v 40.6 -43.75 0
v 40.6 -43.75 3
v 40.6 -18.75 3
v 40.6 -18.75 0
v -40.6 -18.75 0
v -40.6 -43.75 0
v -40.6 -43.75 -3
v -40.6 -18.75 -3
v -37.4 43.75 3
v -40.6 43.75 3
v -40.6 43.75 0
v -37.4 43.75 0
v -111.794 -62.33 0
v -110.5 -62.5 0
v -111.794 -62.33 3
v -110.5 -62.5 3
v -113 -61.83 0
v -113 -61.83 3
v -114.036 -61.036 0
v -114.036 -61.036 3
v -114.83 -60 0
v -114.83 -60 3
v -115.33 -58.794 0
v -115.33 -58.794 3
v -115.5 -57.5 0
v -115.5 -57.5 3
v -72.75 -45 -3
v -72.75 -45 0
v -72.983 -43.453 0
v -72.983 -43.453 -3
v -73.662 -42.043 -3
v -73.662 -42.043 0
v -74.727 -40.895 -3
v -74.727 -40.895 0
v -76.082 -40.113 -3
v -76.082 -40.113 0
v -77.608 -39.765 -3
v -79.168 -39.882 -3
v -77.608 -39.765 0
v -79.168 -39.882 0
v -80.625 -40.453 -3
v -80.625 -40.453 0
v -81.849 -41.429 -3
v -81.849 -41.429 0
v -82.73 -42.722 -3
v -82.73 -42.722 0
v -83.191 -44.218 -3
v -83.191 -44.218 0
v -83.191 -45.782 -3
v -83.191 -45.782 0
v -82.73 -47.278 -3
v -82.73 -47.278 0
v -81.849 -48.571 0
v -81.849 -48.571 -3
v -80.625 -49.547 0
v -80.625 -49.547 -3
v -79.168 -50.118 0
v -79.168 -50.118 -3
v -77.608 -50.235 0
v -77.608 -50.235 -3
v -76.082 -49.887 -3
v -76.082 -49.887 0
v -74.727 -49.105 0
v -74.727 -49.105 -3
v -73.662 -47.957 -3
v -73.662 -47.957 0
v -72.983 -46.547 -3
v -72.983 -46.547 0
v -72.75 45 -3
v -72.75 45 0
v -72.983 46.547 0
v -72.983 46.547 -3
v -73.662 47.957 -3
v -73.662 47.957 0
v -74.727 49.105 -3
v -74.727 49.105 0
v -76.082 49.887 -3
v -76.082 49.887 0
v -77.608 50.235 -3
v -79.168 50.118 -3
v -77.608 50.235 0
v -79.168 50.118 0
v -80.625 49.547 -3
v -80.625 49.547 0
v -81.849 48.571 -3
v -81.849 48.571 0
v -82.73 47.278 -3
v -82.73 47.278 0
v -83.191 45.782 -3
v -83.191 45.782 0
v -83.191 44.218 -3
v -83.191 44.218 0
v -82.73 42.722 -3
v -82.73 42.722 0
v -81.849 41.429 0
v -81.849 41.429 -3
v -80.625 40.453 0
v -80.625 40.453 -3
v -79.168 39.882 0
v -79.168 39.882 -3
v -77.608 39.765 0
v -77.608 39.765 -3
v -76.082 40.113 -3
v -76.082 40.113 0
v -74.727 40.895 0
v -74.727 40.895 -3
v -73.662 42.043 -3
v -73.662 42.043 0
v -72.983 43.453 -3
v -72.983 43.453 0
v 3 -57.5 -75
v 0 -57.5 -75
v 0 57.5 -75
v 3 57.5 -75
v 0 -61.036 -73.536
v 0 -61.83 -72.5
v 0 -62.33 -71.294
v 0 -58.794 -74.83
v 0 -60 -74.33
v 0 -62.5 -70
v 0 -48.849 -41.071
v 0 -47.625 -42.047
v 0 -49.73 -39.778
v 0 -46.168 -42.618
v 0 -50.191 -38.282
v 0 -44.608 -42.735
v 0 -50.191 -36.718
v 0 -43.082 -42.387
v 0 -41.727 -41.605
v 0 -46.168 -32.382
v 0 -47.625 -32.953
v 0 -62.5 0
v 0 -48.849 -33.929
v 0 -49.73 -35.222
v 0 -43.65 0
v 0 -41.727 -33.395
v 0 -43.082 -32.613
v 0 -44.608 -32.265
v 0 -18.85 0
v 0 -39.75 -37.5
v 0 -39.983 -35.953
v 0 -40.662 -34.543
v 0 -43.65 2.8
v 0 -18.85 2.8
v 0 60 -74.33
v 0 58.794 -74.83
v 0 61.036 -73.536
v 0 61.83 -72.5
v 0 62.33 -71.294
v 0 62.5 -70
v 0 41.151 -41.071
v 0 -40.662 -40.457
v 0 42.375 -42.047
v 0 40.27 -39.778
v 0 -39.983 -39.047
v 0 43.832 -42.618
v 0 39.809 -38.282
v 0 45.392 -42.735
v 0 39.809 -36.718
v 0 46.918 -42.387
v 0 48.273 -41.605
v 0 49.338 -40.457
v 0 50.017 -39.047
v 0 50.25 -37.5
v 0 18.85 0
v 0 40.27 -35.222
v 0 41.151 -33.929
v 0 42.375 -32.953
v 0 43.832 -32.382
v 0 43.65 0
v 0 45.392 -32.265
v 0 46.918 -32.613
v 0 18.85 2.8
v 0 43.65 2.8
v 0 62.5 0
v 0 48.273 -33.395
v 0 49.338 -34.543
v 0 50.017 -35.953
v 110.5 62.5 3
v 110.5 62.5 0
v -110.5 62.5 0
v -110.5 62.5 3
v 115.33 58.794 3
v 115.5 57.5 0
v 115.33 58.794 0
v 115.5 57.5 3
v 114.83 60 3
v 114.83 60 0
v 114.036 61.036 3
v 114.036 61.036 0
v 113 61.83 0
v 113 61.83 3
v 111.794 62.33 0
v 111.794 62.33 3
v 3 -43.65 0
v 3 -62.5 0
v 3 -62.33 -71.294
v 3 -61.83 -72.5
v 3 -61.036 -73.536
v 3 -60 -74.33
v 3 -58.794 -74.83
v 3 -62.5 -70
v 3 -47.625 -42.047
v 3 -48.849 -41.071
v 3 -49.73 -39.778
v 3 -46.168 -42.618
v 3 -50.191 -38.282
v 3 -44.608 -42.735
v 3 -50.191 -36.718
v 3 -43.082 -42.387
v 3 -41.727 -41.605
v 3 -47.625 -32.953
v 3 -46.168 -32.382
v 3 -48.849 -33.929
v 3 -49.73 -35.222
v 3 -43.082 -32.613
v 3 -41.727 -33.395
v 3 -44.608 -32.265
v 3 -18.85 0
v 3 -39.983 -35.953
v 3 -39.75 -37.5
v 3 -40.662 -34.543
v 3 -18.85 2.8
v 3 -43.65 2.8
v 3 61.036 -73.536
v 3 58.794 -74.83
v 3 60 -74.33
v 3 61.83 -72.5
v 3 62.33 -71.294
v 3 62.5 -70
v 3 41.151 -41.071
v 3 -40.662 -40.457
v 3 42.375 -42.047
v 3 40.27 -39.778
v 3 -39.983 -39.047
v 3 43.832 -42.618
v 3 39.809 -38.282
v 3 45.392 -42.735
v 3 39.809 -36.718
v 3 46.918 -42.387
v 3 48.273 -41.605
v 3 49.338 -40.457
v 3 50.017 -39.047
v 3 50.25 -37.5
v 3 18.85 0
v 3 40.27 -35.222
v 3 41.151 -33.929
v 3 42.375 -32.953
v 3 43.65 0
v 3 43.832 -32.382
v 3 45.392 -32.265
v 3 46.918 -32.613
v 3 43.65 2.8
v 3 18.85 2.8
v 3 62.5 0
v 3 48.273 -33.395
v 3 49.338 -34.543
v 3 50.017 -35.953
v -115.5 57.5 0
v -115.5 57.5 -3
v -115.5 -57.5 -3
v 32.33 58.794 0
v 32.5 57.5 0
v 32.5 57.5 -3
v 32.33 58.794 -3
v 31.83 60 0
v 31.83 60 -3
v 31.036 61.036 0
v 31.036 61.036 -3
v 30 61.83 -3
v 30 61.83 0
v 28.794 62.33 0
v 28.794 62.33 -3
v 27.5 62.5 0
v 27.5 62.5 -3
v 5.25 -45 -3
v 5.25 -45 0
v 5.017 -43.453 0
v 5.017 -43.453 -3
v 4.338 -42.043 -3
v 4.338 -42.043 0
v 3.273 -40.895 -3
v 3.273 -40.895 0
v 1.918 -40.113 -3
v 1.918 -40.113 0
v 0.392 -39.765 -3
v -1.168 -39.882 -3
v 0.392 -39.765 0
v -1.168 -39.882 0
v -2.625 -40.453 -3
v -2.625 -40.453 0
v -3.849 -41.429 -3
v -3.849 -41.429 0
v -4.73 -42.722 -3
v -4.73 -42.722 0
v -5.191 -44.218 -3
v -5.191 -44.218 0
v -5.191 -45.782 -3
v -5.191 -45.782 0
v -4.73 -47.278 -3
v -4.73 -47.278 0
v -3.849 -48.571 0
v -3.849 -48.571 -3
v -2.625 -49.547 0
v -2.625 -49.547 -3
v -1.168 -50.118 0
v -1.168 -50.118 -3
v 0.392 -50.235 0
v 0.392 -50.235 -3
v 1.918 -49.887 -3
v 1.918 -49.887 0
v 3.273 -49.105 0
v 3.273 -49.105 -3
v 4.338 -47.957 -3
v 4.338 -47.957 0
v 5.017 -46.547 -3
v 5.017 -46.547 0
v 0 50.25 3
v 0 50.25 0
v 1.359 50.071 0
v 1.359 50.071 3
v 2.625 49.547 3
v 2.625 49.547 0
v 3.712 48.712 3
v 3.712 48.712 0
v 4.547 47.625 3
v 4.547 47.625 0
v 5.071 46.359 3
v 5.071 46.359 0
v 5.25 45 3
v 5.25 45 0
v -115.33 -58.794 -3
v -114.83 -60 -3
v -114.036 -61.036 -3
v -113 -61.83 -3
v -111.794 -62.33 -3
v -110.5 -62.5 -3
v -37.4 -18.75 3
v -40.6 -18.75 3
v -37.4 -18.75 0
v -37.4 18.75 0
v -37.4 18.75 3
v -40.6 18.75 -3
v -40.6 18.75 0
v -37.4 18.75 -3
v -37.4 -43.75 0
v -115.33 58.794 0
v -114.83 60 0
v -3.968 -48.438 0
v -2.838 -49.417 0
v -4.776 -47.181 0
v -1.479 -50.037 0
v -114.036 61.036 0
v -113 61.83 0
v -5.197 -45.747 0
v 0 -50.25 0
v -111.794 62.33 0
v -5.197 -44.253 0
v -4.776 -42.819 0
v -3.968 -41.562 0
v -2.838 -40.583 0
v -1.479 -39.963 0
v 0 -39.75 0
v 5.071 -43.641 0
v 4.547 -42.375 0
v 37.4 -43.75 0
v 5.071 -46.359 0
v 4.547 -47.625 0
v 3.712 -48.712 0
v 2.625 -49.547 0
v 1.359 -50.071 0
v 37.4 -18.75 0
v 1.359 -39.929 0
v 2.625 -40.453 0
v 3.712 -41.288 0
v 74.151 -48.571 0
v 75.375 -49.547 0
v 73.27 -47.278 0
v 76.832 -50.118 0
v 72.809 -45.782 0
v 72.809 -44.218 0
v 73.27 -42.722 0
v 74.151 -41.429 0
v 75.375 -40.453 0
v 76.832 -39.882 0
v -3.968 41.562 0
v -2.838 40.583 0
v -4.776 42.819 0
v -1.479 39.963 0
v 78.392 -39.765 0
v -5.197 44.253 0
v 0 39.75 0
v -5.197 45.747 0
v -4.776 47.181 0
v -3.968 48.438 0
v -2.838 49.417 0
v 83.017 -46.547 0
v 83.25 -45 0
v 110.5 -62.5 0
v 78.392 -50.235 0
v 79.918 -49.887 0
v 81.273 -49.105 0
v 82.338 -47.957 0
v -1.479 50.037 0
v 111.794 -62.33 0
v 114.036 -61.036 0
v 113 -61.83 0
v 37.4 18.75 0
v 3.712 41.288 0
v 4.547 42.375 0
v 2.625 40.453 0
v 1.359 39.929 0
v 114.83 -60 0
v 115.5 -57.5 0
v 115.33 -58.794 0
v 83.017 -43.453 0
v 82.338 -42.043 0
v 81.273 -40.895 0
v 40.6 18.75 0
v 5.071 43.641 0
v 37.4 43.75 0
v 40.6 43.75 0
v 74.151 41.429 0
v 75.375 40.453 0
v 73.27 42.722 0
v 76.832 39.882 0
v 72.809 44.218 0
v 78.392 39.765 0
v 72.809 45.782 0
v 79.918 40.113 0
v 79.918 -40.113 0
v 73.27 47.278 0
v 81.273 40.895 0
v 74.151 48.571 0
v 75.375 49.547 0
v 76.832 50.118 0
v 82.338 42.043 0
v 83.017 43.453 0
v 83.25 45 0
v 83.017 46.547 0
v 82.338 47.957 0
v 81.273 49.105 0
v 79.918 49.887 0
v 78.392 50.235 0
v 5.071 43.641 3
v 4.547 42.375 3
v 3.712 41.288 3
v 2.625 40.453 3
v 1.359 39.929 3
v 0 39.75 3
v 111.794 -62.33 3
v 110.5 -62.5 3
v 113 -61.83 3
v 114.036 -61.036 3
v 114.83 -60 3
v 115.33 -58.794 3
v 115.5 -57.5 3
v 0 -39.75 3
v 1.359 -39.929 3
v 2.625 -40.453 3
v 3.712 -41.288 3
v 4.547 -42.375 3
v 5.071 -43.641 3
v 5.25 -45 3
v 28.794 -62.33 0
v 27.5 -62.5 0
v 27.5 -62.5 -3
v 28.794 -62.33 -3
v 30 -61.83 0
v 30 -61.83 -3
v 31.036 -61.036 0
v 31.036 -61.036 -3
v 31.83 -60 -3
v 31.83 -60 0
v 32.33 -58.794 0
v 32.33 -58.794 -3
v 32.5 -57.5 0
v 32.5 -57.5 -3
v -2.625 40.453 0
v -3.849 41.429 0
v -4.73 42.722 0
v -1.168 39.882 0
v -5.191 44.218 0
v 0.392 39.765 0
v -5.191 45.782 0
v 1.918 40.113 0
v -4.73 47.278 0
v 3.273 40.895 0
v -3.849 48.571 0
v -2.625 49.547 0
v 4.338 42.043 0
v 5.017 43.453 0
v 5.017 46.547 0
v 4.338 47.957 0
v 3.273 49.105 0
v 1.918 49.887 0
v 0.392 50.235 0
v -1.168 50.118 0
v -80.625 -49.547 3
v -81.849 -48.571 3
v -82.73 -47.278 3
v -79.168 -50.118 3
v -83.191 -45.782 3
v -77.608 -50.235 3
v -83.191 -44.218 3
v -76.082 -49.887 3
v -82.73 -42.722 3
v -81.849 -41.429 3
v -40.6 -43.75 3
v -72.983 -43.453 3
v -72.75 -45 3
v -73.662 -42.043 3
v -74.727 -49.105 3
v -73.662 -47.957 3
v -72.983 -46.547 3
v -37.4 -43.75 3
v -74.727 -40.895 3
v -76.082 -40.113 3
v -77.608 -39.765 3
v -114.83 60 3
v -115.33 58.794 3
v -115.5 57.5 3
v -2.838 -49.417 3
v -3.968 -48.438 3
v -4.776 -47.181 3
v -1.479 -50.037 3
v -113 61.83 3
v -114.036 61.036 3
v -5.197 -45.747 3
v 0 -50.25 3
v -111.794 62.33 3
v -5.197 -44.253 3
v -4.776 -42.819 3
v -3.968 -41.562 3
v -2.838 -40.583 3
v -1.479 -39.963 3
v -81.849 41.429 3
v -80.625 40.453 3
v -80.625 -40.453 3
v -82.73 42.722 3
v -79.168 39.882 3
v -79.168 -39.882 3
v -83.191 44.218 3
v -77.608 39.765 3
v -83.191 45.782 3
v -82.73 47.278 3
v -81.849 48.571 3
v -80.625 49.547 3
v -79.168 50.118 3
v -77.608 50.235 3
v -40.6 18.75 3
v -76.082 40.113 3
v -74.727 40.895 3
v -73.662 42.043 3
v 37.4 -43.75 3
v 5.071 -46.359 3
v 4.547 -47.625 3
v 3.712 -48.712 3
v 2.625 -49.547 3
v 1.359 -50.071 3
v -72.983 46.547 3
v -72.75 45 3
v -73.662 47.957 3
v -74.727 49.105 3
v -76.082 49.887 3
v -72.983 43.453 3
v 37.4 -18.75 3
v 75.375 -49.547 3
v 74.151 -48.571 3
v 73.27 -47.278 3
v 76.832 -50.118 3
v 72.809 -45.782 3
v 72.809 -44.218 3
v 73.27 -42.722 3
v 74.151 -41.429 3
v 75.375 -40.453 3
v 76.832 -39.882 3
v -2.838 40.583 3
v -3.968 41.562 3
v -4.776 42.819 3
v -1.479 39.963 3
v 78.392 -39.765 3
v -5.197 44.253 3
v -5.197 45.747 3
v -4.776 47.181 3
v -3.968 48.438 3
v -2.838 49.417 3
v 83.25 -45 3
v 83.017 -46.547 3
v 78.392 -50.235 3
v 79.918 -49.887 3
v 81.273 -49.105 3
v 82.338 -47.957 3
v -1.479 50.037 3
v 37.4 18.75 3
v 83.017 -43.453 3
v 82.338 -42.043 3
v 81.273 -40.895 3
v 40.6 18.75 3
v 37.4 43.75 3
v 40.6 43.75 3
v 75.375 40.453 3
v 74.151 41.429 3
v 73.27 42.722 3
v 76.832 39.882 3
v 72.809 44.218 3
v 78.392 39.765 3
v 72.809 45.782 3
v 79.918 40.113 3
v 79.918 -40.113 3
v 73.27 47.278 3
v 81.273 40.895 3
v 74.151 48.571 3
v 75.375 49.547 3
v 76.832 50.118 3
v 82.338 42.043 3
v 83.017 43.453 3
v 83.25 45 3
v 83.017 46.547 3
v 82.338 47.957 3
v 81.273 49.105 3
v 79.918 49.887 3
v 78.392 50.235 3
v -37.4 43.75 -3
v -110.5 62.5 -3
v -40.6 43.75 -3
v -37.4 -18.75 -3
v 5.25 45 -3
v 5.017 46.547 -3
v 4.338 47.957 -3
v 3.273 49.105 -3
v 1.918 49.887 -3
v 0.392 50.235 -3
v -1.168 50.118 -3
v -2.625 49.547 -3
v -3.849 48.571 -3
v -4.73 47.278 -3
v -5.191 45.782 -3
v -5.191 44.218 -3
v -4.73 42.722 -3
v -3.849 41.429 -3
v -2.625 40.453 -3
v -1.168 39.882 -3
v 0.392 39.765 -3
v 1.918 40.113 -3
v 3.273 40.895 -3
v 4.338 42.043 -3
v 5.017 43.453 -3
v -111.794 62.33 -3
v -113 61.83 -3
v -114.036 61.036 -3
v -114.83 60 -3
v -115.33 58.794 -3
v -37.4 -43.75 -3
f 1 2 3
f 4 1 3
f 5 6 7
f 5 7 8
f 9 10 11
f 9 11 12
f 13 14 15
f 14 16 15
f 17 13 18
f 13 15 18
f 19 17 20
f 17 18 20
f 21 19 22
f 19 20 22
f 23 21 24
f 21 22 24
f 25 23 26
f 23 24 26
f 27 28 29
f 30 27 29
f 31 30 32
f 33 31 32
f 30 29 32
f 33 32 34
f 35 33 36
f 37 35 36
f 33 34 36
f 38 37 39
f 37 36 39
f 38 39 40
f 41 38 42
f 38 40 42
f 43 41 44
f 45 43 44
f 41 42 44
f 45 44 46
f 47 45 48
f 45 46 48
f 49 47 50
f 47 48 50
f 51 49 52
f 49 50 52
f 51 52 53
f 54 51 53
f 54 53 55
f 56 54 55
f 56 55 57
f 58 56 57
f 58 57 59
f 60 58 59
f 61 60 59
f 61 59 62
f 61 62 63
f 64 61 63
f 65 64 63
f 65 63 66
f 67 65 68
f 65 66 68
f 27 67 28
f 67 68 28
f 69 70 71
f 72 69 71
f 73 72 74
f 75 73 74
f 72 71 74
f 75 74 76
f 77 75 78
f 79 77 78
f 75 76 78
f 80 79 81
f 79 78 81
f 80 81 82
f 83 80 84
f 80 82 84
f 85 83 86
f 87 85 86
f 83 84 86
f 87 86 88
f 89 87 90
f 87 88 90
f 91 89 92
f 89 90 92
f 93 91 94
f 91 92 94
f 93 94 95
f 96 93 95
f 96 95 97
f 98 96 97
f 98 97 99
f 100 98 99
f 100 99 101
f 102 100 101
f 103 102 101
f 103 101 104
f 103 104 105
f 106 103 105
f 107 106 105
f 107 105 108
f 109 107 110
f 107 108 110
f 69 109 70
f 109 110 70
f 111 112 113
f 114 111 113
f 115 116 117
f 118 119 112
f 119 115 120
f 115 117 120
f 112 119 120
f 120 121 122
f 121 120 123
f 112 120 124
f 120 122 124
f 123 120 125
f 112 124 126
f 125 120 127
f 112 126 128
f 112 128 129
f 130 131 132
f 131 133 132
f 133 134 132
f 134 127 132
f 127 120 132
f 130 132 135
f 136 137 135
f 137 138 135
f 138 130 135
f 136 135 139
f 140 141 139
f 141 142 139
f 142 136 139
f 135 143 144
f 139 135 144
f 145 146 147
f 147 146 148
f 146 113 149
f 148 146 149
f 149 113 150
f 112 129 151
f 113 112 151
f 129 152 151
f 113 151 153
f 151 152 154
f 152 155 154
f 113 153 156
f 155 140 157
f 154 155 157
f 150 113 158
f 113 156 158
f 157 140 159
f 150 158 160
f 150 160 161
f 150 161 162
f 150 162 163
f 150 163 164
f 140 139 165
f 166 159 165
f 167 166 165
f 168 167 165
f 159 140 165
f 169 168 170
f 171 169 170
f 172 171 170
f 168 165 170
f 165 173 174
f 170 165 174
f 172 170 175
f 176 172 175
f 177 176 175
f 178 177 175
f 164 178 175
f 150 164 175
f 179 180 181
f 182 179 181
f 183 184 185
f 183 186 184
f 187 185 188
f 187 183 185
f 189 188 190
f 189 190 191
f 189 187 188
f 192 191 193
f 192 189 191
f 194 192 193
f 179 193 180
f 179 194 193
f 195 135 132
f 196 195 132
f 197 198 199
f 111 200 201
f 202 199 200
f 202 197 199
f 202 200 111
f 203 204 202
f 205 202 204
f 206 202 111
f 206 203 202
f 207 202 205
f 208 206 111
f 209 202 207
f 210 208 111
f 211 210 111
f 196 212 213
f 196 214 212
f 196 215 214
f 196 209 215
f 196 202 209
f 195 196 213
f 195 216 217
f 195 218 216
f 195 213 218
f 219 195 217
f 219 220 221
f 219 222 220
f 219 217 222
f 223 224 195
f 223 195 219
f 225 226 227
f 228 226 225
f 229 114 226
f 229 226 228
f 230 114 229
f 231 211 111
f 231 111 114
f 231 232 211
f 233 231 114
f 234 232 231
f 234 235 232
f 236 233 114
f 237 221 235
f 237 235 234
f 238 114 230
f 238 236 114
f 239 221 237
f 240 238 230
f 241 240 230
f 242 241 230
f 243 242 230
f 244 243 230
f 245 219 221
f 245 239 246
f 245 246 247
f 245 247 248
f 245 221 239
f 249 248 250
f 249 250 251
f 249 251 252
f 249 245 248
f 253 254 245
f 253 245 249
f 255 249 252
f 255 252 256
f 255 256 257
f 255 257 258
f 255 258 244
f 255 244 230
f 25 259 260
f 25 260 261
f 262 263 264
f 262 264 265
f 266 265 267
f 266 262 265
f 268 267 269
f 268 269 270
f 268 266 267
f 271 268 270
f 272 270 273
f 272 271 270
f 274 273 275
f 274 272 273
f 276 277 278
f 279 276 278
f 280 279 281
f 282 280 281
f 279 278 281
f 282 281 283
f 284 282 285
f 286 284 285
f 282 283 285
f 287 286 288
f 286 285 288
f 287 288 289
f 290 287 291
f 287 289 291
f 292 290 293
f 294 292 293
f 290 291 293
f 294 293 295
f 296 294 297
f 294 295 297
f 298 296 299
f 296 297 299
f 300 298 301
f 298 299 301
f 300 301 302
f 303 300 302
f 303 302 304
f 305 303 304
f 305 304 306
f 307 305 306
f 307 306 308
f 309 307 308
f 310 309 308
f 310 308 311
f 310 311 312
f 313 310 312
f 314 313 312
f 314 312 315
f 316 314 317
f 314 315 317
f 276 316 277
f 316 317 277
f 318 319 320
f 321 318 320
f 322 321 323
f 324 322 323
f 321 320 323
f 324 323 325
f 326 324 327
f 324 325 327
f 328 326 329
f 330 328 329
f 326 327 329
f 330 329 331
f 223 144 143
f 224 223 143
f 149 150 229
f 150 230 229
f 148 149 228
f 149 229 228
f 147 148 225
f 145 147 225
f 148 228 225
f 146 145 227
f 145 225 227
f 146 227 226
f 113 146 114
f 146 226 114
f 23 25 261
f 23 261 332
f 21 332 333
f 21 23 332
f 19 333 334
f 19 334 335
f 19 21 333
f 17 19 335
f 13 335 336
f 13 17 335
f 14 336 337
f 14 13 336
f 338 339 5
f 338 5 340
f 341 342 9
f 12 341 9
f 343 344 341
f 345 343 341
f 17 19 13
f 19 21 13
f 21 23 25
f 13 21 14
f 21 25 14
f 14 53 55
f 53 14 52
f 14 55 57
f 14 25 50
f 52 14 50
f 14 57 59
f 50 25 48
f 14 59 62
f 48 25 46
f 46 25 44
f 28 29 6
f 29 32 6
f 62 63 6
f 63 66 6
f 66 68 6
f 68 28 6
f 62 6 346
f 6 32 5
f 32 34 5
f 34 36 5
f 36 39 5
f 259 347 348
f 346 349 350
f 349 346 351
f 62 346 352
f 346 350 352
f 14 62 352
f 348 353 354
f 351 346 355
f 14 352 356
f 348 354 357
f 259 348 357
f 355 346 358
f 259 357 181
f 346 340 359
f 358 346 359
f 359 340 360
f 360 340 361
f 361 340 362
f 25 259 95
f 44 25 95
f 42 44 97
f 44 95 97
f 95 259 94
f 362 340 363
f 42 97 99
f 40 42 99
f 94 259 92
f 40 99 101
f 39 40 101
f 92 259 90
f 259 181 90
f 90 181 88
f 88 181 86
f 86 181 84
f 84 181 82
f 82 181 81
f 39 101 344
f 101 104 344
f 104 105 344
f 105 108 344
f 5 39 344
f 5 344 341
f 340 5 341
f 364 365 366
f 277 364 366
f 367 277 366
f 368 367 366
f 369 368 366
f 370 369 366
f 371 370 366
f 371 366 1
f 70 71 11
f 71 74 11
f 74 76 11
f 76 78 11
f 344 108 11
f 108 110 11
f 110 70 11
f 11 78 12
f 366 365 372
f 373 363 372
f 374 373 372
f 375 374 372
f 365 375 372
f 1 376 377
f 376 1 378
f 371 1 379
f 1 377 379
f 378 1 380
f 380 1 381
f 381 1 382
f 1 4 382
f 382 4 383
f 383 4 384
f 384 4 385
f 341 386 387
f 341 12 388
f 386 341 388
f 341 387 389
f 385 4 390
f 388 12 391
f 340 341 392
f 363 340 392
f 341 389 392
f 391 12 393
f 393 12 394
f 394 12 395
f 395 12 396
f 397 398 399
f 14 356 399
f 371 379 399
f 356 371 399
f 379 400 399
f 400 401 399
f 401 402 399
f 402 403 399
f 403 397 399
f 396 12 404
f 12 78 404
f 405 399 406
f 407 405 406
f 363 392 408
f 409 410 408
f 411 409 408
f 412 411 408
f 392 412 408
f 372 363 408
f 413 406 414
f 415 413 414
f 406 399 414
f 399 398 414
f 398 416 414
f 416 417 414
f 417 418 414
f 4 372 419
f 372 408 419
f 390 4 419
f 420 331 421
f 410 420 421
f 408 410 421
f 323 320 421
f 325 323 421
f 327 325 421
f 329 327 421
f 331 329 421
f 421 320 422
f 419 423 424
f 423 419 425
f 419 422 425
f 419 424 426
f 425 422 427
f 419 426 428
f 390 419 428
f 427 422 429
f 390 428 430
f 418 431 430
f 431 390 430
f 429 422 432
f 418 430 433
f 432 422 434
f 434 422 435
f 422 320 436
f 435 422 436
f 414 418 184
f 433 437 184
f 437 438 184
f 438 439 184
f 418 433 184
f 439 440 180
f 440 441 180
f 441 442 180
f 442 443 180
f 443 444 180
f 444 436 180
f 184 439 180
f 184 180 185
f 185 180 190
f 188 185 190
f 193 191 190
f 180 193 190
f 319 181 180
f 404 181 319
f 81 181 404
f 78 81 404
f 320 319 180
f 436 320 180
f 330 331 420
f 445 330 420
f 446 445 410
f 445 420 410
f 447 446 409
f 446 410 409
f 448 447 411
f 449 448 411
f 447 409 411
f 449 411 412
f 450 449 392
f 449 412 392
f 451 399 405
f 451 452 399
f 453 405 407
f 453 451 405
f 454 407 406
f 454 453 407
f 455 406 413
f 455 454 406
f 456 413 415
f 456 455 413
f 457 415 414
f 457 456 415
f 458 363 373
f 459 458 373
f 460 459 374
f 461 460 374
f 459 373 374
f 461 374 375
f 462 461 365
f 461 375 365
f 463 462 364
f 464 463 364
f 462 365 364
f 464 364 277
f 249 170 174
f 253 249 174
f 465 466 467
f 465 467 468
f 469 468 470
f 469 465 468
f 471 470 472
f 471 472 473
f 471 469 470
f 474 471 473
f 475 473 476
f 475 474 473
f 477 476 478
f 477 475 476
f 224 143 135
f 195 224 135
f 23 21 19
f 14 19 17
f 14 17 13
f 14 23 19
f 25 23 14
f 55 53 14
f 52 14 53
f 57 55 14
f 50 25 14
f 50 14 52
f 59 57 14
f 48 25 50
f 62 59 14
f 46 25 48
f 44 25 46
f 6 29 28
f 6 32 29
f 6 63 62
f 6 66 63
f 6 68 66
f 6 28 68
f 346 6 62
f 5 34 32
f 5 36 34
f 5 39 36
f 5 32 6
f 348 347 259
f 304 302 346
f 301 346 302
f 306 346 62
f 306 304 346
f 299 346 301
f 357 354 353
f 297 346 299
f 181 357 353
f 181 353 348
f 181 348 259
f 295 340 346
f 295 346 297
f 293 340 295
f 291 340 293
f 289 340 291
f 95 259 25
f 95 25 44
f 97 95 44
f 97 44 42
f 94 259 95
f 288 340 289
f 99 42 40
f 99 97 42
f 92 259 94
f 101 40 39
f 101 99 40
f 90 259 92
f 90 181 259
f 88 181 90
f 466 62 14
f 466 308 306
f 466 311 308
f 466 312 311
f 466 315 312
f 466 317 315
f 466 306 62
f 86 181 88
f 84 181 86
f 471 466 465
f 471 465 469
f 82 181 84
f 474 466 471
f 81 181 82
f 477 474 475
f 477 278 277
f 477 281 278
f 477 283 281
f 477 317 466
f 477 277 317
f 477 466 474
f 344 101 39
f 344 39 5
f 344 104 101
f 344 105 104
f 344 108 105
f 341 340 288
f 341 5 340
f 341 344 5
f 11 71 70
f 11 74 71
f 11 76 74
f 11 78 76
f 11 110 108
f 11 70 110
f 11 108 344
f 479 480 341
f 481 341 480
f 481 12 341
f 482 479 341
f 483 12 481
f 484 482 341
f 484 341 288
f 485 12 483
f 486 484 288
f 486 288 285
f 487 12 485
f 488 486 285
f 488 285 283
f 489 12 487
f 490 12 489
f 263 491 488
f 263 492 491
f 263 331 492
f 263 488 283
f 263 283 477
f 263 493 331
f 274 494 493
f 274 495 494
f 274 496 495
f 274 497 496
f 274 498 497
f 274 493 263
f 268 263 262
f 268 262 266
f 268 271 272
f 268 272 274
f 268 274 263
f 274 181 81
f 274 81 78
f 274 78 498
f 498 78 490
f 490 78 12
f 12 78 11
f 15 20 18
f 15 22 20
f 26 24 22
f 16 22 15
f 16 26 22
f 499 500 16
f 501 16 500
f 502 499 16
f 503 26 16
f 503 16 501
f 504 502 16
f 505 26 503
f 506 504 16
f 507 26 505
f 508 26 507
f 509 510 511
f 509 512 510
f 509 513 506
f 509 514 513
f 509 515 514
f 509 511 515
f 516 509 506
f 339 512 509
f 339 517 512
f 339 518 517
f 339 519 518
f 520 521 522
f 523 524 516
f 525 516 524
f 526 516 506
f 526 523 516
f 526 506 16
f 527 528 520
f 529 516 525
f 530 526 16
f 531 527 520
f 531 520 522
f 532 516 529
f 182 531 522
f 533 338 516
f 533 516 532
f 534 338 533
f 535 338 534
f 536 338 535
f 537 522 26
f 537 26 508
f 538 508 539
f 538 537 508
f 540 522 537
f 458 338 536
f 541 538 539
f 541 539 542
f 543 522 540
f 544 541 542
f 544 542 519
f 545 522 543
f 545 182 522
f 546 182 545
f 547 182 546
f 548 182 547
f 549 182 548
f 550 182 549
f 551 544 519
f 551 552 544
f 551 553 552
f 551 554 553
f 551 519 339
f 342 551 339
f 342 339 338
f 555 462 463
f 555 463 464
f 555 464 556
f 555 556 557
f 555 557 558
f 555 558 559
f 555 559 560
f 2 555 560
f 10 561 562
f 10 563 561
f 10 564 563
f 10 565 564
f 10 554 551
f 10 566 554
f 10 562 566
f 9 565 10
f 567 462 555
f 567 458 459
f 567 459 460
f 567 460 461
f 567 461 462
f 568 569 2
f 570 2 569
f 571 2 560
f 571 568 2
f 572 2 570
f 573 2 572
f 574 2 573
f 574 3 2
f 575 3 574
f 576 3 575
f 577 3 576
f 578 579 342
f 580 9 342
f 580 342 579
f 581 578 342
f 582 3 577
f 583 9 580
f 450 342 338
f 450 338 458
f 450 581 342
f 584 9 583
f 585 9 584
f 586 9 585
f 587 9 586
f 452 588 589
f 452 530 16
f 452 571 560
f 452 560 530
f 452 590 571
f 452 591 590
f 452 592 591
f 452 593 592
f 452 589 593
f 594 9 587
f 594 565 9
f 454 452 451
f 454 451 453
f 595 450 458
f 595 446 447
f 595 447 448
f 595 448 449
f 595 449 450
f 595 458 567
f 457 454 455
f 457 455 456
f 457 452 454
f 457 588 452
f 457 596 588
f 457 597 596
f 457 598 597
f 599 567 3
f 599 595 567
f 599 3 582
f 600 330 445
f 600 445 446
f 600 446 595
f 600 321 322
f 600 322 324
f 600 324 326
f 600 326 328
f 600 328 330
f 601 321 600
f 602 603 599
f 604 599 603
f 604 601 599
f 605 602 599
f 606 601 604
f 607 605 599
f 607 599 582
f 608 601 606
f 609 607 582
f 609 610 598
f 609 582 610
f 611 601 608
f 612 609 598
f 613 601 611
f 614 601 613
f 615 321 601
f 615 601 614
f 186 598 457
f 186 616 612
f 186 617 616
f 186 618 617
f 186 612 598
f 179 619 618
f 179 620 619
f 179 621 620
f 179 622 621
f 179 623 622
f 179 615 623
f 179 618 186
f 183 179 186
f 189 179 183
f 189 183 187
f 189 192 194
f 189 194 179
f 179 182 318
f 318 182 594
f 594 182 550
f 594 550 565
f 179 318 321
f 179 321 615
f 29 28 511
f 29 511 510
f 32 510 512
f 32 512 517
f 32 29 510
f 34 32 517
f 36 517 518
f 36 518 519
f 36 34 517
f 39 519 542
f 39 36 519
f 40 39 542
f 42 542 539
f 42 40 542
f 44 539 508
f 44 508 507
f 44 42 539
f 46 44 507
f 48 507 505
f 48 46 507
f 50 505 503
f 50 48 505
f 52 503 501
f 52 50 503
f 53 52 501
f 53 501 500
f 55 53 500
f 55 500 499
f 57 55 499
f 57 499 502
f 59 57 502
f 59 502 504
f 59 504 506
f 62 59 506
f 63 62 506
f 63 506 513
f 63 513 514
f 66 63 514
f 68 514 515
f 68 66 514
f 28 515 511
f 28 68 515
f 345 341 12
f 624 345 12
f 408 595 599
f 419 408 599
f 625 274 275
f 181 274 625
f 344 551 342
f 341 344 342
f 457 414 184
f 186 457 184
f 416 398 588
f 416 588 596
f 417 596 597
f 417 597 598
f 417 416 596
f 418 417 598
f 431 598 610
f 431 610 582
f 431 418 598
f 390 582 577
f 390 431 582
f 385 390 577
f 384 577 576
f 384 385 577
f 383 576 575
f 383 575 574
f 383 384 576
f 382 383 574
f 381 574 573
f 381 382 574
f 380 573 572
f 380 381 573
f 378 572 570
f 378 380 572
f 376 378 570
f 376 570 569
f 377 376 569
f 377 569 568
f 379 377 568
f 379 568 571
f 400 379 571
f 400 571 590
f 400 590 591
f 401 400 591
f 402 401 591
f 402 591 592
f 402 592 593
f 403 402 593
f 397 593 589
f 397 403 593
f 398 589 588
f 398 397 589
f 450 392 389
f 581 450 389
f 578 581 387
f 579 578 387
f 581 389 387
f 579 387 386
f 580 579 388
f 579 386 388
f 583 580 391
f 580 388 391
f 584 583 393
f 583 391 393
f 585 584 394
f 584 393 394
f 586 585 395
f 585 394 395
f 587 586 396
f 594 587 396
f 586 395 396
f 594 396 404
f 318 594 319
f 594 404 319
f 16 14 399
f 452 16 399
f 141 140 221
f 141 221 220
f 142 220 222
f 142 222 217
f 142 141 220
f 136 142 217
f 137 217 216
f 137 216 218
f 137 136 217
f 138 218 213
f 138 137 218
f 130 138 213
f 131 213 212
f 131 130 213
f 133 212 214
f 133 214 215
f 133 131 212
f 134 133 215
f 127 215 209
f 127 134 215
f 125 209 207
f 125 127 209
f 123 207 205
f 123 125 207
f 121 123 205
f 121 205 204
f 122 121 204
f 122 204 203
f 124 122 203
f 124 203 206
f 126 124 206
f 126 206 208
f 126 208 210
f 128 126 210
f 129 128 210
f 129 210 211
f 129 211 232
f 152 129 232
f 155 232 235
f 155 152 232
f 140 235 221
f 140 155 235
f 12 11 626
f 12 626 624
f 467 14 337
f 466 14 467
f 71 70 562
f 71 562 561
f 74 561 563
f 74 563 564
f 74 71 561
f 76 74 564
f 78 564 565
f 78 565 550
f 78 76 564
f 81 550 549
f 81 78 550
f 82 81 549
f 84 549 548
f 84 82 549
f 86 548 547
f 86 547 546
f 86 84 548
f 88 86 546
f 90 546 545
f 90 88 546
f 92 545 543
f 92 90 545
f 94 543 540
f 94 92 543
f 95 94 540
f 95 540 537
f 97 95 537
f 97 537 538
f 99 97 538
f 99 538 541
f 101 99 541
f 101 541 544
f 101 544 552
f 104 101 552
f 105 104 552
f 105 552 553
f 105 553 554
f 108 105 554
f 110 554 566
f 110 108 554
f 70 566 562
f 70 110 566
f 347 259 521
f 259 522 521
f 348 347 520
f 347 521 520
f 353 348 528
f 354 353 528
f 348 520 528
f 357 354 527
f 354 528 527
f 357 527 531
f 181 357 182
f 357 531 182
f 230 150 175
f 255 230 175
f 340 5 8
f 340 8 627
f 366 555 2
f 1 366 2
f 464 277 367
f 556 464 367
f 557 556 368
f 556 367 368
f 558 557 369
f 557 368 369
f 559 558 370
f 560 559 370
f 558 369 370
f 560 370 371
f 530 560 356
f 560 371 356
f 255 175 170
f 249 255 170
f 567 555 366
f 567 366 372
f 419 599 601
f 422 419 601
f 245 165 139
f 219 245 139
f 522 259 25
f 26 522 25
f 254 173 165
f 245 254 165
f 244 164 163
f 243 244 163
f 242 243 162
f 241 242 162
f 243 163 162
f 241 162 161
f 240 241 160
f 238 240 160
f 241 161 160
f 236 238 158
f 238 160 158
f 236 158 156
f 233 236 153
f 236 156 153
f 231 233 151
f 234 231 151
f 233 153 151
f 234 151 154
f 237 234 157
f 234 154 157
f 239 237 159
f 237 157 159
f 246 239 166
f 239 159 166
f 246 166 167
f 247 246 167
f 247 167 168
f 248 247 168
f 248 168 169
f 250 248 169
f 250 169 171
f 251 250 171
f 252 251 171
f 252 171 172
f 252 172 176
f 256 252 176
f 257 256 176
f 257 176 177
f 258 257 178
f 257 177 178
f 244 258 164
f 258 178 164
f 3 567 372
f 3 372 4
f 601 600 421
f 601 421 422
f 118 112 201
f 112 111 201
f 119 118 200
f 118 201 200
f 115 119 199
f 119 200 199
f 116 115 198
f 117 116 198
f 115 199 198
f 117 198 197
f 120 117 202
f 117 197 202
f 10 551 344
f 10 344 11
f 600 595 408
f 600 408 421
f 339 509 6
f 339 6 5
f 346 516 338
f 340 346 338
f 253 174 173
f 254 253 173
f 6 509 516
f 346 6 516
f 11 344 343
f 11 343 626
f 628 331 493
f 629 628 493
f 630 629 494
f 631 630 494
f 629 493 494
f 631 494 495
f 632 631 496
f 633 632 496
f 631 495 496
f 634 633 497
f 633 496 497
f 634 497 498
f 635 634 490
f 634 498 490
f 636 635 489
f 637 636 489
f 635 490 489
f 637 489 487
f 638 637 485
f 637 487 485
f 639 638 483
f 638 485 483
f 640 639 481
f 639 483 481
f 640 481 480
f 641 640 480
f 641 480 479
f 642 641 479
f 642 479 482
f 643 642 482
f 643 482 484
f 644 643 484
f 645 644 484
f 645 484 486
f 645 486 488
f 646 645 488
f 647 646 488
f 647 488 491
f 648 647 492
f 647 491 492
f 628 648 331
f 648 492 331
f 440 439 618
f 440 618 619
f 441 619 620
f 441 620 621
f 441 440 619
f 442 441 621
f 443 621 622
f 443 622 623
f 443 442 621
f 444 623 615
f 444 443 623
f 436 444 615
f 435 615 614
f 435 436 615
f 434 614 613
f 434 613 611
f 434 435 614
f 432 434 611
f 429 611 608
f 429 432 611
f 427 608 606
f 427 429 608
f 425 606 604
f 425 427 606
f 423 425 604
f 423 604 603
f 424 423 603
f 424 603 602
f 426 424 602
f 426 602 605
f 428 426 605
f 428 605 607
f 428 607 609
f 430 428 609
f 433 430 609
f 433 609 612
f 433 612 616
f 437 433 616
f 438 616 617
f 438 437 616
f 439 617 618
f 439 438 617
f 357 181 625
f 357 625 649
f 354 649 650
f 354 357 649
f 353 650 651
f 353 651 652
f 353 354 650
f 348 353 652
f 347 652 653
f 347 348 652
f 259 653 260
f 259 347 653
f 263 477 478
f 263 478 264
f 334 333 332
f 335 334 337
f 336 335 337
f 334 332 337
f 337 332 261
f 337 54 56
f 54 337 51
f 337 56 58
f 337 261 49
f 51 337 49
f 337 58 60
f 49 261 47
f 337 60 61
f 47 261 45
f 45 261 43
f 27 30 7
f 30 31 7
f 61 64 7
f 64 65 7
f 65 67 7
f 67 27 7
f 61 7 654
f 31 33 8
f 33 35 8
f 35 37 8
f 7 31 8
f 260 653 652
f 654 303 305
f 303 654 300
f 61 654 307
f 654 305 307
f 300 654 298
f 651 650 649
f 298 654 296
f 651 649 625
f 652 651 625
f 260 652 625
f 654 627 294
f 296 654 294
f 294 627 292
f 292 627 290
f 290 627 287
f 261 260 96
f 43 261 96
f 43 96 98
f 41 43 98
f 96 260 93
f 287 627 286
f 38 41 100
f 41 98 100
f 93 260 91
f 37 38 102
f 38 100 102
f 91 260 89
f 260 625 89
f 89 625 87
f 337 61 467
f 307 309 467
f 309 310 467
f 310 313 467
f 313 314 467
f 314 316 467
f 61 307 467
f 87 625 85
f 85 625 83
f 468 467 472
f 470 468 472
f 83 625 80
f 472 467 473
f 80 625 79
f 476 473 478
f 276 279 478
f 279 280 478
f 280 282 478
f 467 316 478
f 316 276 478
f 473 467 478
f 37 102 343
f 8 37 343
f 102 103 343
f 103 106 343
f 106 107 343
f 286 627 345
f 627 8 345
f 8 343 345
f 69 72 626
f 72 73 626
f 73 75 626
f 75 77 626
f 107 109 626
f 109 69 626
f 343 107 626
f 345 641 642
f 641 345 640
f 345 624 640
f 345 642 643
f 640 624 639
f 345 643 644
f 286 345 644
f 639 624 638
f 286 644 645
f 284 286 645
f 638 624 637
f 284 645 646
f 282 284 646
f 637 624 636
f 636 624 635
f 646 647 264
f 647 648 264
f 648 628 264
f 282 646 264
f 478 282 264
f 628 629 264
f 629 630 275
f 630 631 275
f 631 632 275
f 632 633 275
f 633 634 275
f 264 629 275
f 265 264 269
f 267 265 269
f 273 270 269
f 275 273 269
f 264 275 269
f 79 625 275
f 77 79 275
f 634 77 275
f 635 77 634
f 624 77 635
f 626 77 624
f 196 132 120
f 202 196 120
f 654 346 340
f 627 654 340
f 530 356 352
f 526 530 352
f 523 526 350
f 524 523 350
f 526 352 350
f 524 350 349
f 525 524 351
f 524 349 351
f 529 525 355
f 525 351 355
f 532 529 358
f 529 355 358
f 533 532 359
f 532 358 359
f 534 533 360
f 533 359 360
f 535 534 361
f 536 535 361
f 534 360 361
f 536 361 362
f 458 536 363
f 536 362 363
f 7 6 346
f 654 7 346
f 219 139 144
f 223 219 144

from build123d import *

# Parameters (mm, degrees)
F0_R     = 5.25
F1_DEPTH = 3
F2_W     = 3.2
F2_H     = 25
F3_DEPTH = 25
F4_R     = 5
F5_R     = 5.25
F6_DEPTH = 3
F7_R     = 5
F8_R     = 5.25
F8_W     = 3.2
F8_H     = 25
F9_DEPTH = 3


with BuildPart() as f1:
    # F0 (on Top) → F1 (new body)
    with BuildSketch(Plane.XY):
        with BuildLine():
            Line((0, 0), (-115.5, 0))
            Line((-115.5, 0), (-115.5, -62.5))
            Line((-115.5, -62.5), (0, -62.5))
            Line((0, -62.5), (0, -50.25))
            ThreePointArc((0, -50.25), (-5.25, -45), (0, -39.75))
            Line((0, -39.75), (0, 0))
        make_face()
        with Locations((-78, -45)):
            Circle(F0_R, mode=Mode.SUBTRACT)
        with BuildLine():
            Line((115.5, 0), (0, 0))
            Line((0, 0), (0, -39.75))
            ThreePointArc((0, -39.75), (3.712311, -41.287689), (5.25, -45))
            ThreePointArc((5.25, -45), (3.712311, -48.712311), (0, -50.25))
            Line((0, -50.25), (0, -62.5))
            Line((0, -62.5), (115.5, -62.5))
            Line((115.5, -62.5), (115.5, 0))
        make_face()
        with Locations((78, -45)):
            Circle(F0_R, mode=Mode.SUBTRACT)
        with BuildLine():
            Line((115.5, 62.5), (0, 62.5))
            Line((0, 62.5), (0, 50.25))
            ThreePointArc((0, 50.25), (3.712311, 48.712311), (5.25, 45))
            ThreePointArc((5.25, 45), (3.712311, 41.287689), (0, 39.75))
            Line((0, 39.75), (0, 0))
            Line((0, 0), (115.5, 0))
            Line((115.5, 0), (115.5, 62.5))
        make_face()
        with Locations((78, 45)):
            Circle(F0_R, mode=Mode.SUBTRACT)
        with BuildLine():
            Line((0, 62.5), (-115.5, 62.5))
            Line((-115.5, 62.5), (-115.5, 0))
            Line((-115.5, 0), (0, 0))
            Line((0, 0), (0, 39.75))
            ThreePointArc((0, 39.75), (-5.25, 45), (0, 50.25))
            Line((0, 50.25), (0, 62.5))
        make_face()
        with Locations((-78, 45)):
            Circle(F0_R, mode=Mode.SUBTRACT)
    extrude(amount=F1_DEPTH)

    # F2 (on face) → F3 (cut)
    with BuildSketch(Plane.XY.offset(3)):
        with Locations((39, 31.25)):
            Rectangle(F2_W, F2_H)
        with Locations((-39, 31.25)):
            Rectangle(F2_W, F2_H)
        with Locations((39, -31.25)):
            Rectangle(F2_W, F2_H)
        with Locations((-39, -31.25)):
            Rectangle(F2_W, F2_H)
    extrude(amount=-F3_DEPTH, mode=Mode.SUBTRACT)

    # F4
    f4_edges = [f1.edges().sort_by_distance(p)[0] for p in [
        (115.5, 62.5, 1.5),
        (115.5, -62.5, 1.5),
        (-115.5, 62.5, 1.5),
        (-115.5, -62.5, 1.5),
    ]]
    fillet(f4_edges, radius=F4_R)


with BuildPart() as f6:
    # F5 (on Right) → F6 (new body)
    with BuildSketch(Plane.YZ):
        Polygon((62.5, -75), (62.5, 0), (43.65, 0), (43.65, 2.8), (18.85, 2.8), (18.85, 0), (-18.85, 0), (-18.85, 2.8), (-43.65, 2.8), (-43.65, 0), (-62.5, 0), (-62.5, -75), align=None)
        with Locations((-45, -37.5)):
            Circle(F5_R, mode=Mode.SUBTRACT)
        with BuildLine():
            ThreePointArc((39.75, -37.5), (45, -32.25), (50.25, -37.5))
            ThreePointArc((50.25, -37.5), (45, -42.75), (39.75, -37.5))
        make_face(mode=Mode.SUBTRACT)
    extrude(amount=F6_DEPTH)

    # F7
    f7_edges = [f6.edges().sort_by_distance(p)[0] for p in [
        (1.5, 62.5, -75),
        (1.5, -62.5, -75),
    ]]
    fillet(f7_edges, radius=F7_R)


with BuildPart() as f9:
    # F8 (on Top) → F9 (new body)
    with BuildSketch(Plane.XY):
        with BuildLine():
            Line((27.5, 62.5), (-110.5, 62.5))
            ThreePointArc((-110.5, 62.5), (-114.035534, 61.035534), (-115.5, 57.5))
            Line((-115.5, 57.5), (-115.5, -57.5))
            ThreePointArc((-115.5, -57.5), (-114.035534, -61.035534), (-110.5, -62.5))
            Line((-110.5, -62.5), (27.5, -62.5))
            ThreePointArc((27.5, -62.5), (31.035534, -61.035534), (32.5, -57.5))
            Line((32.5, -57.5), (32.5, 0))
            Line((32.5, 0), (32.5, 57.5))
            ThreePointArc((32.5, 57.5), (31.035534, 61.035534), (27.5, 62.5))
        make_face()
        with Locations((-78, -45)):
            Circle(F8_R, mode=Mode.SUBTRACT)
        with Locations((0, -45)):
            Circle(F8_R, mode=Mode.SUBTRACT)
        with Locations((-39, -31.25)):
            Rectangle(F8_W, F8_H, mode=Mode.SUBTRACT)
        with Locations((-78, 45)):
            Circle(F8_R, mode=Mode.SUBTRACT)
        with Locations((-39, 31.25)):
            Rectangle(F8_W, F8_H, mode=Mode.SUBTRACT)
        with Locations((0, 45)):
            Circle(F8_R, mode=Mode.SUBTRACT)
    extrude(amount=-F9_DEPTH)


solid = Compound([f1.part, f6.part, f9.part])
